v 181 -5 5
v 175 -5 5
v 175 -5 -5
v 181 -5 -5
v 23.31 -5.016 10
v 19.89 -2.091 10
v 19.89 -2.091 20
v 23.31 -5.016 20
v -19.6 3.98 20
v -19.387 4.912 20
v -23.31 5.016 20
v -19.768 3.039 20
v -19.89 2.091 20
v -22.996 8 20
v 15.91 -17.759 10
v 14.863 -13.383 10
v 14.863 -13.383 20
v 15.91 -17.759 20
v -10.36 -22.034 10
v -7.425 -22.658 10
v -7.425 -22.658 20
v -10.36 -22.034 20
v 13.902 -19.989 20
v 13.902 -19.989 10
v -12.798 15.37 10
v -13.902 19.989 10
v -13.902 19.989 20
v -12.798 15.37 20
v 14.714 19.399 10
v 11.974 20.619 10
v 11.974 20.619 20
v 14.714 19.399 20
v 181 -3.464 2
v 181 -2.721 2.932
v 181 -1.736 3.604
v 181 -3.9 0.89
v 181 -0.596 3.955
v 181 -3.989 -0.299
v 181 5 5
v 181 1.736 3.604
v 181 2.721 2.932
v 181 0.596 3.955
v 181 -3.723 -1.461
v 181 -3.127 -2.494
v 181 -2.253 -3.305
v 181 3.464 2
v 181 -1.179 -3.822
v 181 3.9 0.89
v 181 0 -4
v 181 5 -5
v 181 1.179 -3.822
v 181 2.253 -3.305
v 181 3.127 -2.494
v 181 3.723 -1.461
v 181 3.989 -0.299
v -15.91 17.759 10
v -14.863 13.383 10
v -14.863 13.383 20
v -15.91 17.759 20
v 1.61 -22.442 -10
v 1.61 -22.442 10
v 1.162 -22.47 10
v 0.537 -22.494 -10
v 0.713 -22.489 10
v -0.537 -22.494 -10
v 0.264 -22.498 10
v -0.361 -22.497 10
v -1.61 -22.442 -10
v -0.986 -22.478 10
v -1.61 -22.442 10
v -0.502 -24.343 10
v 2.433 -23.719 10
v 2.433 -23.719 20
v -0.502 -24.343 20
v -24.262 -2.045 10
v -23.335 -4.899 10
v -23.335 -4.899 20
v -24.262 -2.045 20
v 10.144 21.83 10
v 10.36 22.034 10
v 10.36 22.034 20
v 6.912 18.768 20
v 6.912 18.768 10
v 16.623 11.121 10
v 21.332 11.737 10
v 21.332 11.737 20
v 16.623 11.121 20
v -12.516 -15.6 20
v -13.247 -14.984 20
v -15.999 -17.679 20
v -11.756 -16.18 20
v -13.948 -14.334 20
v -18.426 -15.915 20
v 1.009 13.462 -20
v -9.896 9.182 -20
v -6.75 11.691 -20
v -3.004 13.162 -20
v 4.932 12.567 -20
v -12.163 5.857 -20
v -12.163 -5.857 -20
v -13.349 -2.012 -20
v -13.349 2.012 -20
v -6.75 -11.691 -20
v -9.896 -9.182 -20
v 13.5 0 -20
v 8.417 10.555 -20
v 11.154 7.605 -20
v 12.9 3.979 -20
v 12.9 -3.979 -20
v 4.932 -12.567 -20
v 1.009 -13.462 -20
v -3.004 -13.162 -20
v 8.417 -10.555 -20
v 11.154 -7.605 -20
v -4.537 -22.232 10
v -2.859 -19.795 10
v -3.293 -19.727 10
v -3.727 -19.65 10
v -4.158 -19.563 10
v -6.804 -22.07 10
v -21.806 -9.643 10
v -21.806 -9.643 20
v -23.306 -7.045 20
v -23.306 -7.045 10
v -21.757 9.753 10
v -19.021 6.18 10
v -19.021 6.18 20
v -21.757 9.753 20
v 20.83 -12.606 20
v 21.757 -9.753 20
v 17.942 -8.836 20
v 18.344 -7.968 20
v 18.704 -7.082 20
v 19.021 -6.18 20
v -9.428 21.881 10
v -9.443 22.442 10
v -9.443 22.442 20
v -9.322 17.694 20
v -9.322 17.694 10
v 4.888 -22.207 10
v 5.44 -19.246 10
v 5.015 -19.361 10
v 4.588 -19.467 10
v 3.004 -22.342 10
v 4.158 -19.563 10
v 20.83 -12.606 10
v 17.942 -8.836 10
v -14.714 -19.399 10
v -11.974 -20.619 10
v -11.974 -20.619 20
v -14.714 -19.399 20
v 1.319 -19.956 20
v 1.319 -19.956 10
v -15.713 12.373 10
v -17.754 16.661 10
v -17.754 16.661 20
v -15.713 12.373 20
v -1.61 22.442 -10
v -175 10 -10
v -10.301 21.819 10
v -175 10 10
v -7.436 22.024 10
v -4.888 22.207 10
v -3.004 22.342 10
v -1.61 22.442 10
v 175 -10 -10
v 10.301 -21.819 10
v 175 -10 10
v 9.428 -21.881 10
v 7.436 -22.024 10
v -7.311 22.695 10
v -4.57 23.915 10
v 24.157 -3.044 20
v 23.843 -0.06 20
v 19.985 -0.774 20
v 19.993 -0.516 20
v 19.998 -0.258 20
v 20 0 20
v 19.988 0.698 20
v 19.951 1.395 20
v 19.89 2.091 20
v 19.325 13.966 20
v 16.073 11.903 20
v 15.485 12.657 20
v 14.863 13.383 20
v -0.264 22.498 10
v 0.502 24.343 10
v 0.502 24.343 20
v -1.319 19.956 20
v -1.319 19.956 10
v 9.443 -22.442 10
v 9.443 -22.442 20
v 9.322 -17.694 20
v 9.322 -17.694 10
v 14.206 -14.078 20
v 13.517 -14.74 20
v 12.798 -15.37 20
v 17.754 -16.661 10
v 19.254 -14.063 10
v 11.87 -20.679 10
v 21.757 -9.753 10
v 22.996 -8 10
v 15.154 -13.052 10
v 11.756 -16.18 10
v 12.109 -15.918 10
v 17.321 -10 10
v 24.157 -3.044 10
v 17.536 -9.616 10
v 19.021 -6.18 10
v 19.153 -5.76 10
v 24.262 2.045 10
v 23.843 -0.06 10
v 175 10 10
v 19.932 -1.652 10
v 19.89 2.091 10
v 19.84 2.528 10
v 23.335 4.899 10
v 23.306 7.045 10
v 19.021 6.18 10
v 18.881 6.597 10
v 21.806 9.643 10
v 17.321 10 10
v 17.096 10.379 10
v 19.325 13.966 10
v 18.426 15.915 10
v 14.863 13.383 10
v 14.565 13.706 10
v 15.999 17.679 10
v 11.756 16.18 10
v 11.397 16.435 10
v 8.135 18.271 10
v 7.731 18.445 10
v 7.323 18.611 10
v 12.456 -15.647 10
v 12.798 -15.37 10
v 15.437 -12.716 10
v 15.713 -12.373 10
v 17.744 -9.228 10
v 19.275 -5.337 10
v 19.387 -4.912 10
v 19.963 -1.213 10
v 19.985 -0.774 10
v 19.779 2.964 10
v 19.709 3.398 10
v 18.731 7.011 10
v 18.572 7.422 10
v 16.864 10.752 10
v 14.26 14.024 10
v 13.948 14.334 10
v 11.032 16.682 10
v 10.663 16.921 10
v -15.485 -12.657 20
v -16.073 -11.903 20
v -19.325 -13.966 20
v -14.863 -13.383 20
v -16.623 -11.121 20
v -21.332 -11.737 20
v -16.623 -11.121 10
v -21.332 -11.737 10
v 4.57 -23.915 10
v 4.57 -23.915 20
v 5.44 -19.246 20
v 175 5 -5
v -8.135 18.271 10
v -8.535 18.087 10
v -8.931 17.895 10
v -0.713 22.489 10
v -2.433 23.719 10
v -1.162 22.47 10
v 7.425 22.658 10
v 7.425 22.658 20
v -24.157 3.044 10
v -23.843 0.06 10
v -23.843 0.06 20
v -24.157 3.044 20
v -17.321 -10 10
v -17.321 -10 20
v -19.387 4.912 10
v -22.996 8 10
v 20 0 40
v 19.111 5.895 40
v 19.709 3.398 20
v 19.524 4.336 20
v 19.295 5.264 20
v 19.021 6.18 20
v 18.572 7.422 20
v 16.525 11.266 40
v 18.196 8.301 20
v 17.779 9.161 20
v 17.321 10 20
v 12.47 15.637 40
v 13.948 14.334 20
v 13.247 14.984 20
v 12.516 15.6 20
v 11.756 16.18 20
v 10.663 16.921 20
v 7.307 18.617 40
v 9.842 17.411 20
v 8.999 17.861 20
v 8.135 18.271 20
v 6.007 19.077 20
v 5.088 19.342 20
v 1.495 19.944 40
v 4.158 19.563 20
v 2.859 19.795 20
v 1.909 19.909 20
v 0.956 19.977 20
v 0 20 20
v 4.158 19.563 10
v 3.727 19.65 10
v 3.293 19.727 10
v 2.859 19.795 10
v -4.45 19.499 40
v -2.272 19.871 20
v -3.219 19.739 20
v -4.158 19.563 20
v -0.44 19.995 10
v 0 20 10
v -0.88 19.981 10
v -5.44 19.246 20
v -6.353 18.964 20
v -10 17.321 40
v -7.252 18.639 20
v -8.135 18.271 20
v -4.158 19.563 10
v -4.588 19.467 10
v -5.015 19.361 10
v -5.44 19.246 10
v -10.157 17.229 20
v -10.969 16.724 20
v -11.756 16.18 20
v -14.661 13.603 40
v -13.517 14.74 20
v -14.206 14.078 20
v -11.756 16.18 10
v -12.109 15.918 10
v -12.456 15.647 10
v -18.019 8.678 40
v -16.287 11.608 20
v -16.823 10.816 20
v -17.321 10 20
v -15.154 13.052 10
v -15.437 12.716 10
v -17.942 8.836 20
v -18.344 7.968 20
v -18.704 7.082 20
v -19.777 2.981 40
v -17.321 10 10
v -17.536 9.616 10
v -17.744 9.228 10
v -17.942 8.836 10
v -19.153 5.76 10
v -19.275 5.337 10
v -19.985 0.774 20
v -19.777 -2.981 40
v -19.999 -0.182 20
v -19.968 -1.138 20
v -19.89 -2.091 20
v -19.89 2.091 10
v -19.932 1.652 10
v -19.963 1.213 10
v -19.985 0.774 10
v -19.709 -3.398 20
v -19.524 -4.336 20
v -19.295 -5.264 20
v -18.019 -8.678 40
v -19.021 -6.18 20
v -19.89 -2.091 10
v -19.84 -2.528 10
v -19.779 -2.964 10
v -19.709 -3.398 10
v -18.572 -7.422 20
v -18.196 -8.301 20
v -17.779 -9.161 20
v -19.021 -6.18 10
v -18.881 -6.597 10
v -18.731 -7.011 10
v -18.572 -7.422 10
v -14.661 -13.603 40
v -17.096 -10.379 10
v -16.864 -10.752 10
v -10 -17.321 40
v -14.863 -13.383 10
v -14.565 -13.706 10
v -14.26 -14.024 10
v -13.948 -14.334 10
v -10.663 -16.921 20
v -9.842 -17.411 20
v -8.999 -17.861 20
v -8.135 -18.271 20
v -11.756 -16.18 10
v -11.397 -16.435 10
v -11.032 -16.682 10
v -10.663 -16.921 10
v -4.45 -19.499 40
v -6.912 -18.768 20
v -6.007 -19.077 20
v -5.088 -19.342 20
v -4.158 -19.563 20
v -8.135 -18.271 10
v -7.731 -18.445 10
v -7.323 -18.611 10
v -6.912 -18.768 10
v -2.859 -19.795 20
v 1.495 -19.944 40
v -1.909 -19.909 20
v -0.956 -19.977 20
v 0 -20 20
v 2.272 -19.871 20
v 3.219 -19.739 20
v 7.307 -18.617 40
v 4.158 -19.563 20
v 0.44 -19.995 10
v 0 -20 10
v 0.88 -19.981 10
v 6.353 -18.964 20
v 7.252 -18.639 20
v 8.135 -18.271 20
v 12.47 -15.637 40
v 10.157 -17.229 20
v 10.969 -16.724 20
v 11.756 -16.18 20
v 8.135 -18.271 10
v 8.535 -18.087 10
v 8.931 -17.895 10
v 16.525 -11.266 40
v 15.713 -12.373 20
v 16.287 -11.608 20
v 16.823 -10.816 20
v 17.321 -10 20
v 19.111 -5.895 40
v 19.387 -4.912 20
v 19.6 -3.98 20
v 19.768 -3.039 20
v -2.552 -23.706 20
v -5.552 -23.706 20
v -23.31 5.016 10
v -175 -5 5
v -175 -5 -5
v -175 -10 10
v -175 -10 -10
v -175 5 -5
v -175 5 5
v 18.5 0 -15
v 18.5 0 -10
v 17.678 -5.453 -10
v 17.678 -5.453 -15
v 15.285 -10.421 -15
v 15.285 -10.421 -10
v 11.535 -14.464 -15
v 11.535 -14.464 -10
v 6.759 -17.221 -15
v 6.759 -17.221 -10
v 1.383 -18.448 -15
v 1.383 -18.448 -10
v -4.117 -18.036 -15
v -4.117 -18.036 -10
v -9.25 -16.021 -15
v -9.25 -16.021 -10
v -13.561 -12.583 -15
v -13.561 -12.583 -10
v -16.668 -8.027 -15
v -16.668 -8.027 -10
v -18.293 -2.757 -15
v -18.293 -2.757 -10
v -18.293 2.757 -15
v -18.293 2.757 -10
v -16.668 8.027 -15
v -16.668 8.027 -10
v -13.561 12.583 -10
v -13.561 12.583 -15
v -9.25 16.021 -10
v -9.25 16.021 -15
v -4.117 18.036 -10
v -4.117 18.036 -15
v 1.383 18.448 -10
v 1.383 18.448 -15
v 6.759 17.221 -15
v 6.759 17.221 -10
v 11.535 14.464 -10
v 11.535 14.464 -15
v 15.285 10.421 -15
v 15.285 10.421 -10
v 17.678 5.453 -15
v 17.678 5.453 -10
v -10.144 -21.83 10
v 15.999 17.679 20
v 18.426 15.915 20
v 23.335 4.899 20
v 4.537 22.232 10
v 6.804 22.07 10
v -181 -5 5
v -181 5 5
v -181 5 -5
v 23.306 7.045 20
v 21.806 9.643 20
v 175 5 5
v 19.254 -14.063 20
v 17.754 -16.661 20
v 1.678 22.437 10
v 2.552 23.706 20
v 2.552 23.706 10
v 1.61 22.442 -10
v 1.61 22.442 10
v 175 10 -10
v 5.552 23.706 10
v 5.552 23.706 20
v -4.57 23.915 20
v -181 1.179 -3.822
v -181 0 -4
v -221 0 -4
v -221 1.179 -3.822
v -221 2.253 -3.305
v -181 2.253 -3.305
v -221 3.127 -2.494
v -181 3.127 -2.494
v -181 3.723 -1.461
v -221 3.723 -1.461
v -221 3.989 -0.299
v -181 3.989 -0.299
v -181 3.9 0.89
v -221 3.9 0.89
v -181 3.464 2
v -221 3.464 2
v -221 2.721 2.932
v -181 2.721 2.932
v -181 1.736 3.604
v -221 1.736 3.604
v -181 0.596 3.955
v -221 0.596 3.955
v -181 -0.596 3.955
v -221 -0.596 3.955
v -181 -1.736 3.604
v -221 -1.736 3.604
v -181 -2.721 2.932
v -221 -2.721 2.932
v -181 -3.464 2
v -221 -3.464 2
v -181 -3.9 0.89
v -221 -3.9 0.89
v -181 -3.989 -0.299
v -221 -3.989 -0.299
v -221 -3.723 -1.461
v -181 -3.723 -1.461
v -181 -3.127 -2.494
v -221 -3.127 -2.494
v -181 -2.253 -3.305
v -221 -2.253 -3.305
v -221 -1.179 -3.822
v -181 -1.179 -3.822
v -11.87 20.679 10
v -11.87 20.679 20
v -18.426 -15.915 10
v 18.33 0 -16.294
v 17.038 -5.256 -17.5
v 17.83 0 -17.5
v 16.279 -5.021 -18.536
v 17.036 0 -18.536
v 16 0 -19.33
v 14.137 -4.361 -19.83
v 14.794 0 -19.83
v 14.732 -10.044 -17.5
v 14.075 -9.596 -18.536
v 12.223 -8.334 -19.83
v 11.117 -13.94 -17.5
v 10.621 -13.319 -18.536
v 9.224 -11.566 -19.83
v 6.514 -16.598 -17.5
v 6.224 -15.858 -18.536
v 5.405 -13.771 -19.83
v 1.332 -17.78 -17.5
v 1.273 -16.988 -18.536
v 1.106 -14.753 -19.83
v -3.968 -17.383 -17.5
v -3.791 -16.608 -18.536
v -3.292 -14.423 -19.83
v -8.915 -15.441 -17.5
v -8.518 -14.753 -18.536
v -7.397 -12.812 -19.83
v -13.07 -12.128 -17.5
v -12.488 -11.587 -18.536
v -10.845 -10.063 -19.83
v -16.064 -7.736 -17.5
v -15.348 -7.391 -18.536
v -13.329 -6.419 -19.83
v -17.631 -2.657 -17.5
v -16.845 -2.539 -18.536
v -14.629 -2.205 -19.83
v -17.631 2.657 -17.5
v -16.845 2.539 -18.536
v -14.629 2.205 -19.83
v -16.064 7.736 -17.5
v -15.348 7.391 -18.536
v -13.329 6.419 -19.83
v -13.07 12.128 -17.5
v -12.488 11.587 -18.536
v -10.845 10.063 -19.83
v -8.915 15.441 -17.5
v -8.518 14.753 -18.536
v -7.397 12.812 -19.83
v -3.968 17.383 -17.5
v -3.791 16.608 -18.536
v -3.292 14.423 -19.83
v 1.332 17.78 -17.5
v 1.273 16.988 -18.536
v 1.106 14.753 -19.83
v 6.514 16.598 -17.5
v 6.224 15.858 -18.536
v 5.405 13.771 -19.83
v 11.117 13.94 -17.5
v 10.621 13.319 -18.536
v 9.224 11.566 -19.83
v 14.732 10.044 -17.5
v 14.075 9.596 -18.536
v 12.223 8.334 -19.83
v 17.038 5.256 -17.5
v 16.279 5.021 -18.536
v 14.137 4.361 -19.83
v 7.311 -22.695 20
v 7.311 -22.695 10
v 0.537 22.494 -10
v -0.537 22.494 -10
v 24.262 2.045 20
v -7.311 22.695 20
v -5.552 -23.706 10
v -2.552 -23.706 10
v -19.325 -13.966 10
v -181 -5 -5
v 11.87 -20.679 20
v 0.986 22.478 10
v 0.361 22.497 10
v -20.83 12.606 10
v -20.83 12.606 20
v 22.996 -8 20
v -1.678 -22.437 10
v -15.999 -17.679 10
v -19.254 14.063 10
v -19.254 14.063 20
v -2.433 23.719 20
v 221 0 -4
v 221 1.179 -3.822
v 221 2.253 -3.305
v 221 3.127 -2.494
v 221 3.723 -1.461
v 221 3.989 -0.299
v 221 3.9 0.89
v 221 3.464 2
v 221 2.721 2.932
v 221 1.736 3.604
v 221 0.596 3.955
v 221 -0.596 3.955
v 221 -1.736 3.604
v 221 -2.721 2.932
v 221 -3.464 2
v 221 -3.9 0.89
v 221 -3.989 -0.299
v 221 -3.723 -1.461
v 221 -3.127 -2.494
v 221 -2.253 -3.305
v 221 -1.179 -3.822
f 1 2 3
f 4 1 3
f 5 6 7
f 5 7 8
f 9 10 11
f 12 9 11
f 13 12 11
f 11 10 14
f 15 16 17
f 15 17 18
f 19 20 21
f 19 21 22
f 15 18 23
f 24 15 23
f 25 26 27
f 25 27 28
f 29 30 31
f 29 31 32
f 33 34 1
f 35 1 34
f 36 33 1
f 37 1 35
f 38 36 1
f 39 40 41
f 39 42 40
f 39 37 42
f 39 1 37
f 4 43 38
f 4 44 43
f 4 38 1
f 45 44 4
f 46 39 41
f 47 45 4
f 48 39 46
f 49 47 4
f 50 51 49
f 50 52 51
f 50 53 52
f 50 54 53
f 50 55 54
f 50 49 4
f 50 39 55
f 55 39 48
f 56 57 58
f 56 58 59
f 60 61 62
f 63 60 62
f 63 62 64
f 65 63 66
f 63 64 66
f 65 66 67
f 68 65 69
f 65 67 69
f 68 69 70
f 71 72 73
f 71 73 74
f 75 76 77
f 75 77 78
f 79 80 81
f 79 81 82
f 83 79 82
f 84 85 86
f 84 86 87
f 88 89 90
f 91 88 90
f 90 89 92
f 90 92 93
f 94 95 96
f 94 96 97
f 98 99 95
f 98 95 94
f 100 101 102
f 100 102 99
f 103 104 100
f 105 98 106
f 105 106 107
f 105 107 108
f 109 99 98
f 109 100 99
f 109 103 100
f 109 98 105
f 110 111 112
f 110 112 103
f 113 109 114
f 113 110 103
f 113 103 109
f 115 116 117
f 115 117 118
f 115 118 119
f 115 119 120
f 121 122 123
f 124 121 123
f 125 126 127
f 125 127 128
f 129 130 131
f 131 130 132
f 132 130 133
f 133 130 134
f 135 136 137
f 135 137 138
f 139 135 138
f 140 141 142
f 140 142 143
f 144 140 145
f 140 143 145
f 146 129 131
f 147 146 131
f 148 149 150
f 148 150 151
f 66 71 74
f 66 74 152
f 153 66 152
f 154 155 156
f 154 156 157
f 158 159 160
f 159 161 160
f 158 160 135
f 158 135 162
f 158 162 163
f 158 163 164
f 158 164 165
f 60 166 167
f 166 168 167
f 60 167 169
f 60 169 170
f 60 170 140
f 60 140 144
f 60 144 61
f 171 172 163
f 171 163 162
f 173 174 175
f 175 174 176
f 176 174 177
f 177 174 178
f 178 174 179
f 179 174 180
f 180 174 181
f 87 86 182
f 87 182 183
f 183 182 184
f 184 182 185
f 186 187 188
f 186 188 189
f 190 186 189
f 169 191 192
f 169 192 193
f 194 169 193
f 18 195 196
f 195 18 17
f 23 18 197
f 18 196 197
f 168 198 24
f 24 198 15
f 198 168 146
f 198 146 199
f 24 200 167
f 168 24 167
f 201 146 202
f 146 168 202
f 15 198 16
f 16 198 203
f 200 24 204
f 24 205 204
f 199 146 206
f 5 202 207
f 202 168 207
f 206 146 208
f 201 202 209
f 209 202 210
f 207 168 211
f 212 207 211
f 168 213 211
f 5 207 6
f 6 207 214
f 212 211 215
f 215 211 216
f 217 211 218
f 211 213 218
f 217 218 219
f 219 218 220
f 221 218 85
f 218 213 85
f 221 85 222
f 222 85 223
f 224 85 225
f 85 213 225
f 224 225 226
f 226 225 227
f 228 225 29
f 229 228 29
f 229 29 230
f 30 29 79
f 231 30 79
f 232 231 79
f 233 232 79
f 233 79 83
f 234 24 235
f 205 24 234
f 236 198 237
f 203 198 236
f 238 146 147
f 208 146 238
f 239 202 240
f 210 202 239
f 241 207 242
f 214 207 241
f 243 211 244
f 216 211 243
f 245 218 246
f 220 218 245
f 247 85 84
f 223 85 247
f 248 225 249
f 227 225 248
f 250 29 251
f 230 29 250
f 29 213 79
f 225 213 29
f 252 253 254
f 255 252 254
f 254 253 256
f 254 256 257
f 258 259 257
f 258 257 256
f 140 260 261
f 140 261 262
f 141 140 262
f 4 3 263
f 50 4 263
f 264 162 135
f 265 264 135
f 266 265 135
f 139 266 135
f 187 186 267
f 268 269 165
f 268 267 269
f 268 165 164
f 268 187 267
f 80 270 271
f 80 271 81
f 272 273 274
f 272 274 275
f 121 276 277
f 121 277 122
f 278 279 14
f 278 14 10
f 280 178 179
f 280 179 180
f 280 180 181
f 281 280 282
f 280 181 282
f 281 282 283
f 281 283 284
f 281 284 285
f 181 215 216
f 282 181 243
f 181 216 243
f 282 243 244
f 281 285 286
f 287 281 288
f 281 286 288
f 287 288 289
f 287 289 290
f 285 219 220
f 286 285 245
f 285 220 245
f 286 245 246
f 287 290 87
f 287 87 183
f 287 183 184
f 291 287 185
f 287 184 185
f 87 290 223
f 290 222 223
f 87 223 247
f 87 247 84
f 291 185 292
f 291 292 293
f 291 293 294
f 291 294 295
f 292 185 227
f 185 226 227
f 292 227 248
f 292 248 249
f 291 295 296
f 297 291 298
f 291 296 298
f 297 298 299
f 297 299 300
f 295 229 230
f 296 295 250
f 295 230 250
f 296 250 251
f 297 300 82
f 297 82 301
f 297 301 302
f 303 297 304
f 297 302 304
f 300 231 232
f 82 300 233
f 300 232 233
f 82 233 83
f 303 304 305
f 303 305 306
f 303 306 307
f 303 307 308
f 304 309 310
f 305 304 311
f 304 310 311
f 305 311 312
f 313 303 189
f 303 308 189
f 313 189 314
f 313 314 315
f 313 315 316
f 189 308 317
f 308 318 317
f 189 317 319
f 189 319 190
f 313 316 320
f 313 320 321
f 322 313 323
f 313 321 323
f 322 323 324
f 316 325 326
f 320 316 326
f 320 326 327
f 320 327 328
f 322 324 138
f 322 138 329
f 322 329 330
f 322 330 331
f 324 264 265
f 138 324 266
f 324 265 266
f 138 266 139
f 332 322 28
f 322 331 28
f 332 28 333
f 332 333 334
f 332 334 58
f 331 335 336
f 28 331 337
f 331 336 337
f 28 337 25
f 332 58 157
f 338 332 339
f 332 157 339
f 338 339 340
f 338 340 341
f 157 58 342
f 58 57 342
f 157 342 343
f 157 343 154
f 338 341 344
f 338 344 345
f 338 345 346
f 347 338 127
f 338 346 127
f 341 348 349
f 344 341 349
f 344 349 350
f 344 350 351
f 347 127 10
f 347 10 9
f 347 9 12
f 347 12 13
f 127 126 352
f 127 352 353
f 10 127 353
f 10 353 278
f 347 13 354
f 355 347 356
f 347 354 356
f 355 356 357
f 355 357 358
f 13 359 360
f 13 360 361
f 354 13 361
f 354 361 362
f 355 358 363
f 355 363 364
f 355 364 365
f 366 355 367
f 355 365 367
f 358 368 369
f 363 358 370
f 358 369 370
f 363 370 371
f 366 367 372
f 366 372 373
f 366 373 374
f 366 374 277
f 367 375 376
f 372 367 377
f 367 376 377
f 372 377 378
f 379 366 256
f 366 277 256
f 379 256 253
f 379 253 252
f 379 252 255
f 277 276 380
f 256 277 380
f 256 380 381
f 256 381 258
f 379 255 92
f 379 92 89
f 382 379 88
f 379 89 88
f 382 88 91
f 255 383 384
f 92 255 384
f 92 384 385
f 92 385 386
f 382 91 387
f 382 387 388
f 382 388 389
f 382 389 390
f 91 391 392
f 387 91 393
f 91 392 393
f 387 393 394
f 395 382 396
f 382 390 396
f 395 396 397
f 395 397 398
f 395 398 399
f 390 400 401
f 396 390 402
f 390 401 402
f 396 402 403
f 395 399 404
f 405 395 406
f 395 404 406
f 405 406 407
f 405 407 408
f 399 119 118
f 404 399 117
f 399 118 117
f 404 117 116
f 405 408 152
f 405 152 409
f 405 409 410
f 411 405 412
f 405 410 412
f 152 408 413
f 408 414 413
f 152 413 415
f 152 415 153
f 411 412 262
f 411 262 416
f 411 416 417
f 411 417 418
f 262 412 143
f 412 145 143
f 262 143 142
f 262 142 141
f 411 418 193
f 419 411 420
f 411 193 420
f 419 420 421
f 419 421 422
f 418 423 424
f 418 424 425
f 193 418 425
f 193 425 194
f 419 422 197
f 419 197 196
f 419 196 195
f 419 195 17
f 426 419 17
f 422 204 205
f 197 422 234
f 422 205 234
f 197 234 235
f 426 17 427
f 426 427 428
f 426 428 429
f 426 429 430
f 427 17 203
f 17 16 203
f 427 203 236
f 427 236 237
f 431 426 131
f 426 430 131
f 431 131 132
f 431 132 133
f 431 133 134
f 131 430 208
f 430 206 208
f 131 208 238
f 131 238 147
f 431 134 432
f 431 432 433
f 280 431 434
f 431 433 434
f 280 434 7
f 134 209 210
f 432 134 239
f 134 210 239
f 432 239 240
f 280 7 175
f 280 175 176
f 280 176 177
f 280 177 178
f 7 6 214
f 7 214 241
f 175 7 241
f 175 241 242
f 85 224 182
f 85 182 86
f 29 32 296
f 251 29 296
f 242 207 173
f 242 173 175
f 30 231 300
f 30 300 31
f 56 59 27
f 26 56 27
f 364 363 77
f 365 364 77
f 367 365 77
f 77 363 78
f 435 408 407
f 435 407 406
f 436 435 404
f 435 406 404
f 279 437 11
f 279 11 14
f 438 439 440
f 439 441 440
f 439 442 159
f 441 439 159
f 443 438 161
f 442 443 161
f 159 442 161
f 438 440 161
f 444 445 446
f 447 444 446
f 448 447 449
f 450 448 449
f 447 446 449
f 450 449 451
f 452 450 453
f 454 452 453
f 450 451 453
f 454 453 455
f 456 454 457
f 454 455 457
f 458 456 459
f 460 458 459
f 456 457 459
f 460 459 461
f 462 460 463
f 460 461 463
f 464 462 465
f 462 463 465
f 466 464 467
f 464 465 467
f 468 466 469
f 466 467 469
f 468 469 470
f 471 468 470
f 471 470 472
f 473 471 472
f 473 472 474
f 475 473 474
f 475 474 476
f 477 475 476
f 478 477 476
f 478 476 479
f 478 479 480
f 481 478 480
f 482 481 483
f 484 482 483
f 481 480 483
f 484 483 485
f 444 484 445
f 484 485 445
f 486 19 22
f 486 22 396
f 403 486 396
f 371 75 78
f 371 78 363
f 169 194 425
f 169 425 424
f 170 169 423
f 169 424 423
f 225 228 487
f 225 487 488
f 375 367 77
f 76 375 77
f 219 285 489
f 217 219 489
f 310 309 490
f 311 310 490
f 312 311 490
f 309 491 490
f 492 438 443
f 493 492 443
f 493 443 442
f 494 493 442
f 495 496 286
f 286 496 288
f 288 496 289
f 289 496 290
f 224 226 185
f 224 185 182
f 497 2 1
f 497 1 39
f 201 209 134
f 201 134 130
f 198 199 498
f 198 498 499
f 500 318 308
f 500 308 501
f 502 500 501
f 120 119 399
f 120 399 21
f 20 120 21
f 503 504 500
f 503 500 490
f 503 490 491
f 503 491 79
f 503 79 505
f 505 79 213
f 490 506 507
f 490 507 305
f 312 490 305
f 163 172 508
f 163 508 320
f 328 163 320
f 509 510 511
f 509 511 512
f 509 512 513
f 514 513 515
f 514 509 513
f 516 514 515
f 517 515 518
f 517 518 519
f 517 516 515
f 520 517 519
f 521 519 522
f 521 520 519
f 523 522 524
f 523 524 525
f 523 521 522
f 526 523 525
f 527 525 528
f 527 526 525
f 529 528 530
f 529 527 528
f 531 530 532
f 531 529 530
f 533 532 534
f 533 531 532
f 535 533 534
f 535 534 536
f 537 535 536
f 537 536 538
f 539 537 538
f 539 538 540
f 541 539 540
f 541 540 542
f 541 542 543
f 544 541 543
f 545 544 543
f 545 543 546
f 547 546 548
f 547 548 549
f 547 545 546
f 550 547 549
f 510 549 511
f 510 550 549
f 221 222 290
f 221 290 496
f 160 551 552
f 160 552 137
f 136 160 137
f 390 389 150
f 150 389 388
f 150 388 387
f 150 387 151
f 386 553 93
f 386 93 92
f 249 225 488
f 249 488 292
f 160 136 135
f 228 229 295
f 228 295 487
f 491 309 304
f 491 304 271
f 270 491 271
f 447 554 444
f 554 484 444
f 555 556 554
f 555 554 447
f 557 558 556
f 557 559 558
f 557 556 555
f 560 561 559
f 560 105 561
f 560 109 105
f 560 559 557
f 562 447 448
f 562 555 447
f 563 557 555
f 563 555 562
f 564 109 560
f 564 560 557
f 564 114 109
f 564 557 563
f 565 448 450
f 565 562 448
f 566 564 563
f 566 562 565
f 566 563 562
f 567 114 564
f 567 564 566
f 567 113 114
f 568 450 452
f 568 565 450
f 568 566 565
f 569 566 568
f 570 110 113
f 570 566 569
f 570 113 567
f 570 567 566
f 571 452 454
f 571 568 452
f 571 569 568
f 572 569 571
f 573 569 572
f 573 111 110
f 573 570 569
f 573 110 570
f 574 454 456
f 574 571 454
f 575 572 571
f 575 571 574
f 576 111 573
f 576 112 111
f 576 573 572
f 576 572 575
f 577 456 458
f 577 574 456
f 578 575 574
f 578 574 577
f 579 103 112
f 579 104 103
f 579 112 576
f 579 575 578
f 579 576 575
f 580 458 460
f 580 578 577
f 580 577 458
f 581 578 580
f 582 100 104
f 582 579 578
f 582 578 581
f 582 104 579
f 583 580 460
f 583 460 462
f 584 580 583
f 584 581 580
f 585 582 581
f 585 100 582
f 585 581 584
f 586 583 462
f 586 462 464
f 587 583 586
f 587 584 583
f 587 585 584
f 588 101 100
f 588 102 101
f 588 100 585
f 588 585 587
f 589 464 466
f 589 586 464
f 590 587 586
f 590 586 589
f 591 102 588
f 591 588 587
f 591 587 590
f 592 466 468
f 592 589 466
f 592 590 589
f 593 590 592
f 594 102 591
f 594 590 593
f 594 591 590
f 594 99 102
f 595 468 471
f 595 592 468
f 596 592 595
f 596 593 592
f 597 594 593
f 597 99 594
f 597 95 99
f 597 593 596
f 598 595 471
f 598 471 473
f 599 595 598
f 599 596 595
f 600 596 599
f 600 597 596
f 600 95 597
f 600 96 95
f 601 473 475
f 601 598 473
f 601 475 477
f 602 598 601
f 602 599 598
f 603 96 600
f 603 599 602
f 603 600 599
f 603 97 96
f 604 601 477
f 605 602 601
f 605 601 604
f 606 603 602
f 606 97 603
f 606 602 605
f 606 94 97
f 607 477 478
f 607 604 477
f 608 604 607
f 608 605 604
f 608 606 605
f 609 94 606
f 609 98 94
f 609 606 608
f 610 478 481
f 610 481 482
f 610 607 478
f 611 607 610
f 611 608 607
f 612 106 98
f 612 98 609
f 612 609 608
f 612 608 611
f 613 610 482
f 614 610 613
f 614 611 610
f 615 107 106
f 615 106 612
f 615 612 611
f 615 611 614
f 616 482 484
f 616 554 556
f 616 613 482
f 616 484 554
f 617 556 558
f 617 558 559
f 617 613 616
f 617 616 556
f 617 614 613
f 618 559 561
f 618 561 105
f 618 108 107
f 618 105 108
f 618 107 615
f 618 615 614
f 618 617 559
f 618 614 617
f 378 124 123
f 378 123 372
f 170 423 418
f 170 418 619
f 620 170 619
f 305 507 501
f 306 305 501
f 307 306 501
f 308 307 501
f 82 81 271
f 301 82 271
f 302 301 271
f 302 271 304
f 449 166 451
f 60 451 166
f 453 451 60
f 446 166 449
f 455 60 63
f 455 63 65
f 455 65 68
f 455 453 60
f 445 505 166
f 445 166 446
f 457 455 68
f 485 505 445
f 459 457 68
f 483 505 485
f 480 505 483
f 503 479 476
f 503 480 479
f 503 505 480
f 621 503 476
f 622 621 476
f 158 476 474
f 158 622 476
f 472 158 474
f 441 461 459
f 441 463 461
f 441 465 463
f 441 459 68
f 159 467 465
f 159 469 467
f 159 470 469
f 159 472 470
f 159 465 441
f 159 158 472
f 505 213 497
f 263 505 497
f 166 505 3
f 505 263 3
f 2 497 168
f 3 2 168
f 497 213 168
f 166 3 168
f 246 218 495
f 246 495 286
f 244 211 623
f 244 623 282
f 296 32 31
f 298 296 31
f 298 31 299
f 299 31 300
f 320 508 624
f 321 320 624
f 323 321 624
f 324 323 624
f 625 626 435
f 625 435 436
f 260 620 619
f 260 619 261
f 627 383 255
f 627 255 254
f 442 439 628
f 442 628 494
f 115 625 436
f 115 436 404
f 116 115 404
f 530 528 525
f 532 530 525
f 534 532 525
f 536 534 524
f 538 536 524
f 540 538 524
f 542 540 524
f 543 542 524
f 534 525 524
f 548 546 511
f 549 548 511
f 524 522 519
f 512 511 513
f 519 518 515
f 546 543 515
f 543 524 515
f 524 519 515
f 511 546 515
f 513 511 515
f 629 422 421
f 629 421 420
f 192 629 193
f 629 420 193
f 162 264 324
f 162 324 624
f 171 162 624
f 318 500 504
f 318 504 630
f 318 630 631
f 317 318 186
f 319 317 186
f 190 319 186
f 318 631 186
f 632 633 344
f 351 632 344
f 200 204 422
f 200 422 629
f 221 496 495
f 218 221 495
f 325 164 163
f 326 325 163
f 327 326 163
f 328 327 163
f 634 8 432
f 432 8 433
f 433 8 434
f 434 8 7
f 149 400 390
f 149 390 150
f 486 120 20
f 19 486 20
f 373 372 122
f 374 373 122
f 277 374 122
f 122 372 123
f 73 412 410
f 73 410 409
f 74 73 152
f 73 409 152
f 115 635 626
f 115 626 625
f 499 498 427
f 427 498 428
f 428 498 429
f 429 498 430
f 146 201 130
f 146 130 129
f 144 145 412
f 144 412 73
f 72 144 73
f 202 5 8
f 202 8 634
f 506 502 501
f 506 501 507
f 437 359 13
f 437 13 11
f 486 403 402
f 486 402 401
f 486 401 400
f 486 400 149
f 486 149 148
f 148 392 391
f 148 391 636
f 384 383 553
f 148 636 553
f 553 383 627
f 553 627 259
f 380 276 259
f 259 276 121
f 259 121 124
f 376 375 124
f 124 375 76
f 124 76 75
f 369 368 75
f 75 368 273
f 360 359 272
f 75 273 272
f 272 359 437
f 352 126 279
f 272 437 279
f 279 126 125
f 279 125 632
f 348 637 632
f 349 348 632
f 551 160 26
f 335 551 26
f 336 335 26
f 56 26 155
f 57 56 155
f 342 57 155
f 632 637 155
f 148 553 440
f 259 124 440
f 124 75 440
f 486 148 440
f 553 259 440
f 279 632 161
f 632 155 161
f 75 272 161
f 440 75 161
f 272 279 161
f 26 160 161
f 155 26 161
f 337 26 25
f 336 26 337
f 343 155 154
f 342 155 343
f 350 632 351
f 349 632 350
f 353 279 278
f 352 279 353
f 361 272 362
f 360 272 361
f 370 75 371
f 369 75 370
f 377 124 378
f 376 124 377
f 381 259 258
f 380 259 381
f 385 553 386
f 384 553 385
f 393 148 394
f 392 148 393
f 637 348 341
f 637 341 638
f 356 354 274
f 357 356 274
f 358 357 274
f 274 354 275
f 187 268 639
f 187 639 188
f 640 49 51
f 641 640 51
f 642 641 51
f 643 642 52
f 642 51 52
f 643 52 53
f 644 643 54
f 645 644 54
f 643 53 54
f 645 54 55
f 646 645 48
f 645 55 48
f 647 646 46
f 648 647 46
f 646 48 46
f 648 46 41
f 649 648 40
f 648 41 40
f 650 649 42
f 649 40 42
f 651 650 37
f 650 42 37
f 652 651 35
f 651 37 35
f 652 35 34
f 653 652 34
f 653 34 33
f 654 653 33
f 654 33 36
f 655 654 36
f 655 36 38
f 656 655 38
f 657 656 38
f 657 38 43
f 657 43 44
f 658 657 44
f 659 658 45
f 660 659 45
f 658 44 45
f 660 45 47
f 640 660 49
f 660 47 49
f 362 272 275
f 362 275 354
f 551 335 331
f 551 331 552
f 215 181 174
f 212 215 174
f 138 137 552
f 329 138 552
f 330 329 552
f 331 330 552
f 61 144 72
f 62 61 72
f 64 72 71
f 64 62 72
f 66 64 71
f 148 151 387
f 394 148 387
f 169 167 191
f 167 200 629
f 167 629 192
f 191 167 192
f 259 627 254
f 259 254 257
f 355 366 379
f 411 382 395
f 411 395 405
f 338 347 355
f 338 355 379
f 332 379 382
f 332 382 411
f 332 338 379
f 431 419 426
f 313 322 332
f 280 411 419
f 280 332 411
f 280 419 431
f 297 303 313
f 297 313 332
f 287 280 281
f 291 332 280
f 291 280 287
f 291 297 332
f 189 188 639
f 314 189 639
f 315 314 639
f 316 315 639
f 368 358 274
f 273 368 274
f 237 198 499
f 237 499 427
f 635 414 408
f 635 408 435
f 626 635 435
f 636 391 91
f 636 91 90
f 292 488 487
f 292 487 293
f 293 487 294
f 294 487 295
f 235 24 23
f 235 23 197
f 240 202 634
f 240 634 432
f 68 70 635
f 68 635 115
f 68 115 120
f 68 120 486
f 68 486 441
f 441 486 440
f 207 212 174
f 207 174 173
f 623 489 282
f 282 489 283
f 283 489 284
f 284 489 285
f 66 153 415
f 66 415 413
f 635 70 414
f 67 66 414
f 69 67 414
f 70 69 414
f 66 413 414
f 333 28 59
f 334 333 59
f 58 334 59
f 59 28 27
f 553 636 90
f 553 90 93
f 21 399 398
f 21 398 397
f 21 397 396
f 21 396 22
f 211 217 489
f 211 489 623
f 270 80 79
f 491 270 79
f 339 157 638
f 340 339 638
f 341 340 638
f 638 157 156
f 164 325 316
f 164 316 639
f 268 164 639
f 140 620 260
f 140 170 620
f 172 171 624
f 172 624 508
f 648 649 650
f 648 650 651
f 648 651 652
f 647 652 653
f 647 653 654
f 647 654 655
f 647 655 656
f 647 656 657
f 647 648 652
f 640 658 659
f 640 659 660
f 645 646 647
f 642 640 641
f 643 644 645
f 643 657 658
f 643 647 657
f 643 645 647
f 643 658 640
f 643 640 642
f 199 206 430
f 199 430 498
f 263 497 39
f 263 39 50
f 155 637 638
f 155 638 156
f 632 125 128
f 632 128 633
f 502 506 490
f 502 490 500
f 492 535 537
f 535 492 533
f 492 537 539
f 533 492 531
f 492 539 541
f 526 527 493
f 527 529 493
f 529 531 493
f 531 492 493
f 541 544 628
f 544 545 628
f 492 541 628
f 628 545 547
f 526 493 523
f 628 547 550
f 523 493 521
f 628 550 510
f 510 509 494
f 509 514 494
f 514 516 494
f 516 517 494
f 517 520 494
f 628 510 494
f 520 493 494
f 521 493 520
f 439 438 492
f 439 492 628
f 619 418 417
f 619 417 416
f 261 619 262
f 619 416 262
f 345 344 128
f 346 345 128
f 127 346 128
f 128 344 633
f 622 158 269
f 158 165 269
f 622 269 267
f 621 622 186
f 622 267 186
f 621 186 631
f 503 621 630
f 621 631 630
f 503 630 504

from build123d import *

# Parameters (mm, degrees)
BOSS_EXTRUDE1_DEPTH = 10
SKETCH2_R           = 20
BOSS_EXTRUDE2_DEPTH = 30
SKETCH3_R           = 18.5
BOSS_EXTRUDE3_DEPTH = 10
FILLET1_R           = 5
SKETCH4_W           = 10
SKETCH4_H           = 10
BOSS_EXTRUDE4_DEPTH = 6
SKETCH5_R           = 4
BOSS_EXTRUDE5_DEPTH = 40
BOSS_EXTRUDE6_DEPTH = 10


with BuildPart() as part:
    # Sketch1 → Boss-Extrude1 (new, symmetric)
    with BuildSketch(Plane.XY):
        with BuildLine():
            Line((-175, -10), (-175, 10))
            Line((-175, 10), (-1.610440443, 22.442292253))
            ThreePointArc((-1.610440443, 22.442292253), (0, 22.5), (1.610440443, 22.442292253))
            Line((1.610440443, 22.442292253), (175, 10))
            Line((175, 10), (175, -10))
            Line((175, -10), (1.610440443, -22.442292253))
            ThreePointArc((1.610440443, -22.442292253), (0, -22.5), (-1.610440443, -22.442292253))
            Line((-1.610440443, -22.442292253), (-175, -10))
        make_face()
    extrude(amount=BOSS_EXTRUDE1_DEPTH, both=True)

    # Sketch2 → Boss-Extrude2 (add)
    with BuildSketch(Plane.XY.offset(10)):
        Circle(SKETCH2_R)
    extrude(amount=BOSS_EXTRUDE2_DEPTH)

    # Sketch3 → Boss-Extrude3 (add)
    with BuildSketch(Plane(origin=(0, 0, -10), x_dir=(-1, 0, 0), z_dir=(0, 0, -1))):
        with Locations(Location((0, 0, 0), (0, 0, 180))):
            Circle(SKETCH3_R)
    extrude(amount=BOSS_EXTRUDE3_DEPTH)

    # Fillet1
    fillet1_edges = [part.edges().sort_by_distance(p)[0] for p in [
        (-18.5, 0, -20),
    ]]
    fillet(fillet1_edges, radius=FILLET1_R)

    # Sketch4 → Boss-Extrude4 (add)
    with BuildSketch(Plane(origin=(175, 0, 0), x_dir=(0, 0, -1), z_dir=(1, 0, 0))):
        Rectangle(SKETCH4_W, SKETCH4_H)
    boss_extrude4 = extrude(amount=BOSS_EXTRUDE4_DEPTH)

    # Sketch5 → Boss-Extrude5 (add)
    with BuildSketch(Plane(origin=(181, 0, 0), x_dir=(0, 0, -1), z_dir=(1, 0, 0))):
        Circle(SKETCH5_R)
    boss_extrude5 = extrude(amount=BOSS_EXTRUDE5_DEPTH)

    # Mirror1: Boss-Extrude4, Boss-Extrude5 across plane
    add(boss_extrude4.mirror(Plane(origin=(0, 0, 0), x_dir=(0, 0, 1), z_dir=(1, 0, 0))))
    add(boss_extrude5.mirror(Plane(origin=(0, 0, 0), x_dir=(0, 0, 1), z_dir=(1, 0, 0))))

    # Sketch6 → Boss-Extrude6 (add)
    with BuildSketch(Plane.XY.offset(10)):
        with BuildLine():
            Line((0, -20), (-2.552063431, -23.706342165))
            Line((-2.552063431, -23.706342165), (-5.552063431, -23.706342165))
            Line((-5.552063431, -23.706342165), (-2.858606346, -19.79465508))
            ThreePointArc((-2.858606346, -19.79465508), (-1.432986111, -19.948597715), (0, -20))
        make_face()
        with BuildLine():
            Line((-10.359563207, -22.033962815), (-6.911679146, -18.767756695))
            ThreePointArc((-6.911679146, -18.767756695), (-5.549218607, -19.214738428), (-4.158233816, -19.562952015))
            Line((-4.158233816, -19.562952015), (-7.425120405, -22.657697888))
            Line((-7.425120405, -22.657697888), (-10.359563207, -22.033962815))
        make_face()
        with BuildLine():
            Line((-14.71430036, -19.39859356), (-10.662678401, -16.920617285))
            ThreePointArc((-10.662678401, -16.920617285), (-9.422923622, -17.641102869), (-8.134732862, -18.270909153))
            Line((-8.134732862, -18.270909153), (-11.973663987, -20.618803489))
            Line((-11.973663987, -20.618803489), (-14.71430036, -19.39859356))
        make_face()
        with BuildLine():
            Line((-18.42595198, -15.915412681), (-13.947667445, -14.333965705))
            ThreePointArc((-13.947667445, -14.333965705), (-12.884801658, -15.296466463), (-11.755705046, -16.180339887))
            Line((-11.755705046, -16.180339887), (-15.998900997, -17.678768438))
            Line((-15.998900997, -17.678768438), (-18.42595198, -15.915412681))
        make_face()
        with BuildLine():
            Line((-21.332301081, -11.736651898), (-16.623076493, -11.120851042))
            ThreePointArc((-16.623076493, -11.120851042), (-15.783552033, -12.283301072), (-14.86289651, -13.382612127))
            Line((-14.86289651, -13.382612127), (-19.324909262, -13.966086374))
            Line((-19.324909262, -13.966086374), (-21.332301081, -11.736651898))
        make_face()
        with BuildLine():
            Line((-23.306326261, -7.044943108), (-18.571977332, -7.421701825))
            ThreePointArc((-18.571977332, -7.421701825), (-17.992485447, -8.733296482), (-17.320508076, -10))
            Line((-17.320508076, -10), (-21.806326261, -9.643019319))
            Line((-21.806326261, -9.643019319), (-23.306326261, -7.044943108))
        make_face()
        with BuildLine():
            Line((-24.261753148, -2.045336498), (-19.709193643, -3.398188624))
            ThreePointArc((-19.709193643, -3.398188624), (-19.415060909, -4.801604929), (-19.021130326, -6.180339887))
            Line((-19.021130326, -6.180339887), (-23.334702164, -4.898506047))
            Line((-23.334702164, -4.898506047), (-24.261753148, -2.045336498))
        make_face()
        with BuildLine():
            Line((-24.156825, 3.043661131), (-19.985023617, 0.773841725))
            ThreePointArc((-19.985023617, 0.773841725), (-19.989105046, -0.6600602), (-19.890437907, -2.090569265))
            Line((-19.890437907, -2.090569265), (-23.843239611, 0.060095445))
            Line((-23.843239611, 0.060095445), (-24.156825, 3.043661131))
        make_face()
        with BuildLine():
            Line((-22.996127684, 7.999636163), (-19.38741216, 4.912051478))
            ThreePointArc((-19.38741216, 4.912051478), (-19.689529374, 3.510332327), (-19.890437907, 2.090569265))
            Line((-19.890437907, 2.090569265), (-23.309713073, 5.016070477))
            Line((-23.309713073, 5.016070477), (-22.996127684, 7.999636163))
        make_face()
        with BuildLine():
            Line((-20.830389239, 12.605988709), (-17.942477761, 8.835581011))
            ThreePointArc((-17.942477761, 8.835581011), (-18.529426787, 7.527306487), (-19.021130326, 6.180339887))
            Line((-19.021130326, 6.180339887), (-21.757440222, 9.75281916))
            Line((-21.757440222, 9.75281916), (-20.830389239, 12.605988709))
        make_face()
        with BuildLine():
            Line((-17.75426283, 16.661399057), (-15.713370986, 12.372953256))
            ThreePointArc((-15.713370986, 12.372953256), (-16.559499336, 11.215301233), (-17.320508076, 10))
            Line((-17.320508076, 10), (-19.25426283, 14.063322846))
            Line((-19.25426283, 14.063322846), (-17.75426283, 16.661399057))
        make_face()
        with BuildLine():
            Line((-13.902189941, 19.988626317), (-12.797514497, 15.369568071))
            ThreePointArc((-12.797514497, 15.369568071), (-13.865842302, 14.413133499), (-14.86289651, 13.382612127))
            Line((-14.86289651, 13.382612127), (-15.90958176, 17.759191841))
            Line((-15.90958176, 17.759191841), (-13.902189941, 19.988626317))
        make_face()
        with BuildLine():
            Line((-9.442524641, 22.442254691), (-9.322345216, 17.69445901))
            ThreePointArc((-9.322345216, 17.69445901), (-10.566181424, 16.981042669), (-11.755705046, 16.180339887))
            Line((-11.755705046, 16.180339887), (-11.869575624, 20.678898934))
            Line((-11.869575624, 20.678898934), (-9.442524641, 22.442254691))
        make_face()
        with BuildLine():
            Line((-4.570175704, 23.915048844), (-5.439744715, 19.246017184))
            ThreePointArc((-5.439744715, 19.246017184), (-6.804727716, 18.80679879), (-8.134732862, 18.270909153))
            Line((-8.134732862, 18.270909153), (-7.310812077, 22.694838915))
            Line((-7.310812077, 22.694838915), (-4.570175704, 23.915048844))
        make_face()
        with BuildLine():
            Line((0.501911842, 24.342640606), (-1.319401268, 19.956432053))
            ThreePointArc((-1.319401268, 19.956432053), (-2.745874754, 19.810607558), (-4.158233816, 19.562952015))
            Line((-4.158233816, 19.562952015), (-2.43253096, 23.718905534))
            Line((-2.43253096, 23.718905534), (0.501911842, 24.342640606))
        make_face()
        with BuildLine():
            Line((5.552063431, 23.706342165), (2.858606346, 19.79465508))
            ThreePointArc((2.858606346, 19.79465508), (1.432986111, 19.948597715), (0, 20))
            Line((0, 20), (2.552063431, 23.706342165))
            Line((2.552063431, 23.706342165), (5.552063431, 23.706342165))
        make_face()
        with BuildLine():
            Line((10.359563207, 22.033962815), (6.911679146, 18.767756695))
            ThreePointArc((6.911679146, 18.767756695), (5.549218607, 19.214738428), (4.158233816, 19.562952015))
            Line((4.158233816, 19.562952015), (7.425120405, 22.657697888))
            Line((7.425120405, 22.657697888), (10.359563207, 22.033962815))
        make_face()
        with BuildLine():
            Line((14.71430036, 19.39859356), (10.662678401, 16.920617285))
            ThreePointArc((10.662678401, 16.920617285), (9.422923622, 17.641102869), (8.134732862, 18.270909153))
            Line((8.134732862, 18.270909153), (11.973663987, 20.618803489))
            Line((11.973663987, 20.618803489), (14.71430036, 19.39859356))
        make_face()
        with BuildLine():
            Line((18.42595198, 15.915412681), (13.947667445, 14.333965705))
            ThreePointArc((13.947667445, 14.333965705), (12.884801658, 15.296466463), (11.755705046, 16.180339887))
            Line((11.755705046, 16.180339887), (15.998900997, 17.678768438))
            Line((15.998900997, 17.678768438), (18.42595198, 15.915412681))
        make_face()
        with BuildLine():
            Line((21.332301081, 11.736651898), (16.623076493, 11.120851042))
            ThreePointArc((16.623076493, 11.120851042), (15.783552033, 12.283301072), (14.86289651, 13.382612127))
            Line((14.86289651, 13.382612127), (19.324909262, 13.966086374))
            Line((19.324909262, 13.966086374), (21.332301081, 11.736651898))
        make_face()
        with BuildLine():
            Line((23.306326261, 7.044943108), (18.571977332, 7.421701825))
            ThreePointArc((18.571977332, 7.421701825), (17.992485447, 8.733296482), (17.320508076, 10))
            Line((17.320508076, 10), (21.806326261, 9.643019319))
            Line((21.806326261, 9.643019319), (23.306326261, 7.044943108))
        make_face()
        with BuildLine():
            Line((24.261753148, 2.045336498), (19.709193643, 3.398188624))
            ThreePointArc((19.709193643, 3.398188624), (19.415060909, 4.801604929), (19.021130326, 6.180339887))
            Line((19.021130326, 6.180339887), (23.334702164, 4.898506047))
            Line((23.334702164, 4.898506047), (24.261753148, 2.045336498))
        make_face()
        with BuildLine():
            Line((24.156825, -3.043661131), (19.985023617, -0.773841725))
            ThreePointArc((19.985023617, -0.773841725), (19.989105046, 0.6600602), (19.890437907, 2.090569265))
            Line((19.890437907, 2.090569265), (23.843239611, -0.060095445))
            Line((23.843239611, -0.060095445), (24.156825, -3.043661131))
        make_face()
        with BuildLine():
            Line((22.996127684, -7.999636163), (19.38741216, -4.912051478))
            ThreePointArc((19.38741216, -4.912051478), (19.689529374, -3.510332327), (19.890437907, -2.090569265))
            Line((19.890437907, -2.090569265), (23.309713073, -5.016070477))
            Line((23.309713073, -5.016070477), (22.996127684, -7.999636163))
        make_face()
        with BuildLine():
            Line((20.830389239, -12.605988709), (17.942477761, -8.835581011))
            ThreePointArc((17.942477761, -8.835581011), (18.529426787, -7.527306487), (19.021130326, -6.180339887))
            Line((19.021130326, -6.180339887), (21.757440222, -9.75281916))
            Line((21.757440222, -9.75281916), (20.830389239, -12.605988709))
        make_face()
        with BuildLine():
            Line((17.75426283, -16.661399057), (15.713370986, -12.372953256))
            ThreePointArc((15.713370986, -12.372953256), (16.559499336, -11.215301233), (17.320508076, -10))
            Line((17.320508076, -10), (19.25426283, -14.063322846))
            Line((19.25426283, -14.063322846), (17.75426283, -16.661399057))
        make_face()
        with BuildLine():
            Line((13.902189941, -19.988626317), (12.797514497, -15.369568071))
            ThreePointArc((12.797514497, -15.369568071), (13.865842302, -14.413133499), (14.86289651, -13.382612127))
            Line((14.86289651, -13.382612127), (15.90958176, -17.759191841))
            Line((15.90958176, -17.759191841), (13.902189941, -19.988626317))
        make_face()
        with BuildLine():
            Line((9.442524641, -22.442254691), (9.322345216, -17.69445901))
            ThreePointArc((9.322345216, -17.69445901), (10.566181424, -16.981042669), (11.755705046, -16.180339887))
            Line((11.755705046, -16.180339887), (11.869575624, -20.678898934))
            Line((11.869575624, -20.678898934), (9.442524641, -22.442254691))
        make_face()
        with BuildLine():
            Line((4.570175704, -23.915048844), (5.439744715, -19.246017184))
            ThreePointArc((5.439744715, -19.246017184), (6.804727716, -18.80679879), (8.134732862, -18.270909153))
            Line((8.134732862, -18.270909153), (7.310812077, -22.694838915))
            Line((7.310812077, -22.694838915), (4.570175704, -23.915048844))
        make_face()
        with BuildLine():
            Line((-0.501911842, -24.342640606), (1.319401268, -19.956432053))
            ThreePointArc((1.319401268, -19.956432053), (2.745874754, -19.810607558), (4.158233816, -19.562952015))
            Line((4.158233816, -19.562952015), (2.43253096, -23.718905534))
            Line((2.43253096, -23.718905534), (-0.501911842, -24.342640606))
        make_face()
    extrude(amount=BOSS_EXTRUDE6_DEPTH)


solid = part.part
